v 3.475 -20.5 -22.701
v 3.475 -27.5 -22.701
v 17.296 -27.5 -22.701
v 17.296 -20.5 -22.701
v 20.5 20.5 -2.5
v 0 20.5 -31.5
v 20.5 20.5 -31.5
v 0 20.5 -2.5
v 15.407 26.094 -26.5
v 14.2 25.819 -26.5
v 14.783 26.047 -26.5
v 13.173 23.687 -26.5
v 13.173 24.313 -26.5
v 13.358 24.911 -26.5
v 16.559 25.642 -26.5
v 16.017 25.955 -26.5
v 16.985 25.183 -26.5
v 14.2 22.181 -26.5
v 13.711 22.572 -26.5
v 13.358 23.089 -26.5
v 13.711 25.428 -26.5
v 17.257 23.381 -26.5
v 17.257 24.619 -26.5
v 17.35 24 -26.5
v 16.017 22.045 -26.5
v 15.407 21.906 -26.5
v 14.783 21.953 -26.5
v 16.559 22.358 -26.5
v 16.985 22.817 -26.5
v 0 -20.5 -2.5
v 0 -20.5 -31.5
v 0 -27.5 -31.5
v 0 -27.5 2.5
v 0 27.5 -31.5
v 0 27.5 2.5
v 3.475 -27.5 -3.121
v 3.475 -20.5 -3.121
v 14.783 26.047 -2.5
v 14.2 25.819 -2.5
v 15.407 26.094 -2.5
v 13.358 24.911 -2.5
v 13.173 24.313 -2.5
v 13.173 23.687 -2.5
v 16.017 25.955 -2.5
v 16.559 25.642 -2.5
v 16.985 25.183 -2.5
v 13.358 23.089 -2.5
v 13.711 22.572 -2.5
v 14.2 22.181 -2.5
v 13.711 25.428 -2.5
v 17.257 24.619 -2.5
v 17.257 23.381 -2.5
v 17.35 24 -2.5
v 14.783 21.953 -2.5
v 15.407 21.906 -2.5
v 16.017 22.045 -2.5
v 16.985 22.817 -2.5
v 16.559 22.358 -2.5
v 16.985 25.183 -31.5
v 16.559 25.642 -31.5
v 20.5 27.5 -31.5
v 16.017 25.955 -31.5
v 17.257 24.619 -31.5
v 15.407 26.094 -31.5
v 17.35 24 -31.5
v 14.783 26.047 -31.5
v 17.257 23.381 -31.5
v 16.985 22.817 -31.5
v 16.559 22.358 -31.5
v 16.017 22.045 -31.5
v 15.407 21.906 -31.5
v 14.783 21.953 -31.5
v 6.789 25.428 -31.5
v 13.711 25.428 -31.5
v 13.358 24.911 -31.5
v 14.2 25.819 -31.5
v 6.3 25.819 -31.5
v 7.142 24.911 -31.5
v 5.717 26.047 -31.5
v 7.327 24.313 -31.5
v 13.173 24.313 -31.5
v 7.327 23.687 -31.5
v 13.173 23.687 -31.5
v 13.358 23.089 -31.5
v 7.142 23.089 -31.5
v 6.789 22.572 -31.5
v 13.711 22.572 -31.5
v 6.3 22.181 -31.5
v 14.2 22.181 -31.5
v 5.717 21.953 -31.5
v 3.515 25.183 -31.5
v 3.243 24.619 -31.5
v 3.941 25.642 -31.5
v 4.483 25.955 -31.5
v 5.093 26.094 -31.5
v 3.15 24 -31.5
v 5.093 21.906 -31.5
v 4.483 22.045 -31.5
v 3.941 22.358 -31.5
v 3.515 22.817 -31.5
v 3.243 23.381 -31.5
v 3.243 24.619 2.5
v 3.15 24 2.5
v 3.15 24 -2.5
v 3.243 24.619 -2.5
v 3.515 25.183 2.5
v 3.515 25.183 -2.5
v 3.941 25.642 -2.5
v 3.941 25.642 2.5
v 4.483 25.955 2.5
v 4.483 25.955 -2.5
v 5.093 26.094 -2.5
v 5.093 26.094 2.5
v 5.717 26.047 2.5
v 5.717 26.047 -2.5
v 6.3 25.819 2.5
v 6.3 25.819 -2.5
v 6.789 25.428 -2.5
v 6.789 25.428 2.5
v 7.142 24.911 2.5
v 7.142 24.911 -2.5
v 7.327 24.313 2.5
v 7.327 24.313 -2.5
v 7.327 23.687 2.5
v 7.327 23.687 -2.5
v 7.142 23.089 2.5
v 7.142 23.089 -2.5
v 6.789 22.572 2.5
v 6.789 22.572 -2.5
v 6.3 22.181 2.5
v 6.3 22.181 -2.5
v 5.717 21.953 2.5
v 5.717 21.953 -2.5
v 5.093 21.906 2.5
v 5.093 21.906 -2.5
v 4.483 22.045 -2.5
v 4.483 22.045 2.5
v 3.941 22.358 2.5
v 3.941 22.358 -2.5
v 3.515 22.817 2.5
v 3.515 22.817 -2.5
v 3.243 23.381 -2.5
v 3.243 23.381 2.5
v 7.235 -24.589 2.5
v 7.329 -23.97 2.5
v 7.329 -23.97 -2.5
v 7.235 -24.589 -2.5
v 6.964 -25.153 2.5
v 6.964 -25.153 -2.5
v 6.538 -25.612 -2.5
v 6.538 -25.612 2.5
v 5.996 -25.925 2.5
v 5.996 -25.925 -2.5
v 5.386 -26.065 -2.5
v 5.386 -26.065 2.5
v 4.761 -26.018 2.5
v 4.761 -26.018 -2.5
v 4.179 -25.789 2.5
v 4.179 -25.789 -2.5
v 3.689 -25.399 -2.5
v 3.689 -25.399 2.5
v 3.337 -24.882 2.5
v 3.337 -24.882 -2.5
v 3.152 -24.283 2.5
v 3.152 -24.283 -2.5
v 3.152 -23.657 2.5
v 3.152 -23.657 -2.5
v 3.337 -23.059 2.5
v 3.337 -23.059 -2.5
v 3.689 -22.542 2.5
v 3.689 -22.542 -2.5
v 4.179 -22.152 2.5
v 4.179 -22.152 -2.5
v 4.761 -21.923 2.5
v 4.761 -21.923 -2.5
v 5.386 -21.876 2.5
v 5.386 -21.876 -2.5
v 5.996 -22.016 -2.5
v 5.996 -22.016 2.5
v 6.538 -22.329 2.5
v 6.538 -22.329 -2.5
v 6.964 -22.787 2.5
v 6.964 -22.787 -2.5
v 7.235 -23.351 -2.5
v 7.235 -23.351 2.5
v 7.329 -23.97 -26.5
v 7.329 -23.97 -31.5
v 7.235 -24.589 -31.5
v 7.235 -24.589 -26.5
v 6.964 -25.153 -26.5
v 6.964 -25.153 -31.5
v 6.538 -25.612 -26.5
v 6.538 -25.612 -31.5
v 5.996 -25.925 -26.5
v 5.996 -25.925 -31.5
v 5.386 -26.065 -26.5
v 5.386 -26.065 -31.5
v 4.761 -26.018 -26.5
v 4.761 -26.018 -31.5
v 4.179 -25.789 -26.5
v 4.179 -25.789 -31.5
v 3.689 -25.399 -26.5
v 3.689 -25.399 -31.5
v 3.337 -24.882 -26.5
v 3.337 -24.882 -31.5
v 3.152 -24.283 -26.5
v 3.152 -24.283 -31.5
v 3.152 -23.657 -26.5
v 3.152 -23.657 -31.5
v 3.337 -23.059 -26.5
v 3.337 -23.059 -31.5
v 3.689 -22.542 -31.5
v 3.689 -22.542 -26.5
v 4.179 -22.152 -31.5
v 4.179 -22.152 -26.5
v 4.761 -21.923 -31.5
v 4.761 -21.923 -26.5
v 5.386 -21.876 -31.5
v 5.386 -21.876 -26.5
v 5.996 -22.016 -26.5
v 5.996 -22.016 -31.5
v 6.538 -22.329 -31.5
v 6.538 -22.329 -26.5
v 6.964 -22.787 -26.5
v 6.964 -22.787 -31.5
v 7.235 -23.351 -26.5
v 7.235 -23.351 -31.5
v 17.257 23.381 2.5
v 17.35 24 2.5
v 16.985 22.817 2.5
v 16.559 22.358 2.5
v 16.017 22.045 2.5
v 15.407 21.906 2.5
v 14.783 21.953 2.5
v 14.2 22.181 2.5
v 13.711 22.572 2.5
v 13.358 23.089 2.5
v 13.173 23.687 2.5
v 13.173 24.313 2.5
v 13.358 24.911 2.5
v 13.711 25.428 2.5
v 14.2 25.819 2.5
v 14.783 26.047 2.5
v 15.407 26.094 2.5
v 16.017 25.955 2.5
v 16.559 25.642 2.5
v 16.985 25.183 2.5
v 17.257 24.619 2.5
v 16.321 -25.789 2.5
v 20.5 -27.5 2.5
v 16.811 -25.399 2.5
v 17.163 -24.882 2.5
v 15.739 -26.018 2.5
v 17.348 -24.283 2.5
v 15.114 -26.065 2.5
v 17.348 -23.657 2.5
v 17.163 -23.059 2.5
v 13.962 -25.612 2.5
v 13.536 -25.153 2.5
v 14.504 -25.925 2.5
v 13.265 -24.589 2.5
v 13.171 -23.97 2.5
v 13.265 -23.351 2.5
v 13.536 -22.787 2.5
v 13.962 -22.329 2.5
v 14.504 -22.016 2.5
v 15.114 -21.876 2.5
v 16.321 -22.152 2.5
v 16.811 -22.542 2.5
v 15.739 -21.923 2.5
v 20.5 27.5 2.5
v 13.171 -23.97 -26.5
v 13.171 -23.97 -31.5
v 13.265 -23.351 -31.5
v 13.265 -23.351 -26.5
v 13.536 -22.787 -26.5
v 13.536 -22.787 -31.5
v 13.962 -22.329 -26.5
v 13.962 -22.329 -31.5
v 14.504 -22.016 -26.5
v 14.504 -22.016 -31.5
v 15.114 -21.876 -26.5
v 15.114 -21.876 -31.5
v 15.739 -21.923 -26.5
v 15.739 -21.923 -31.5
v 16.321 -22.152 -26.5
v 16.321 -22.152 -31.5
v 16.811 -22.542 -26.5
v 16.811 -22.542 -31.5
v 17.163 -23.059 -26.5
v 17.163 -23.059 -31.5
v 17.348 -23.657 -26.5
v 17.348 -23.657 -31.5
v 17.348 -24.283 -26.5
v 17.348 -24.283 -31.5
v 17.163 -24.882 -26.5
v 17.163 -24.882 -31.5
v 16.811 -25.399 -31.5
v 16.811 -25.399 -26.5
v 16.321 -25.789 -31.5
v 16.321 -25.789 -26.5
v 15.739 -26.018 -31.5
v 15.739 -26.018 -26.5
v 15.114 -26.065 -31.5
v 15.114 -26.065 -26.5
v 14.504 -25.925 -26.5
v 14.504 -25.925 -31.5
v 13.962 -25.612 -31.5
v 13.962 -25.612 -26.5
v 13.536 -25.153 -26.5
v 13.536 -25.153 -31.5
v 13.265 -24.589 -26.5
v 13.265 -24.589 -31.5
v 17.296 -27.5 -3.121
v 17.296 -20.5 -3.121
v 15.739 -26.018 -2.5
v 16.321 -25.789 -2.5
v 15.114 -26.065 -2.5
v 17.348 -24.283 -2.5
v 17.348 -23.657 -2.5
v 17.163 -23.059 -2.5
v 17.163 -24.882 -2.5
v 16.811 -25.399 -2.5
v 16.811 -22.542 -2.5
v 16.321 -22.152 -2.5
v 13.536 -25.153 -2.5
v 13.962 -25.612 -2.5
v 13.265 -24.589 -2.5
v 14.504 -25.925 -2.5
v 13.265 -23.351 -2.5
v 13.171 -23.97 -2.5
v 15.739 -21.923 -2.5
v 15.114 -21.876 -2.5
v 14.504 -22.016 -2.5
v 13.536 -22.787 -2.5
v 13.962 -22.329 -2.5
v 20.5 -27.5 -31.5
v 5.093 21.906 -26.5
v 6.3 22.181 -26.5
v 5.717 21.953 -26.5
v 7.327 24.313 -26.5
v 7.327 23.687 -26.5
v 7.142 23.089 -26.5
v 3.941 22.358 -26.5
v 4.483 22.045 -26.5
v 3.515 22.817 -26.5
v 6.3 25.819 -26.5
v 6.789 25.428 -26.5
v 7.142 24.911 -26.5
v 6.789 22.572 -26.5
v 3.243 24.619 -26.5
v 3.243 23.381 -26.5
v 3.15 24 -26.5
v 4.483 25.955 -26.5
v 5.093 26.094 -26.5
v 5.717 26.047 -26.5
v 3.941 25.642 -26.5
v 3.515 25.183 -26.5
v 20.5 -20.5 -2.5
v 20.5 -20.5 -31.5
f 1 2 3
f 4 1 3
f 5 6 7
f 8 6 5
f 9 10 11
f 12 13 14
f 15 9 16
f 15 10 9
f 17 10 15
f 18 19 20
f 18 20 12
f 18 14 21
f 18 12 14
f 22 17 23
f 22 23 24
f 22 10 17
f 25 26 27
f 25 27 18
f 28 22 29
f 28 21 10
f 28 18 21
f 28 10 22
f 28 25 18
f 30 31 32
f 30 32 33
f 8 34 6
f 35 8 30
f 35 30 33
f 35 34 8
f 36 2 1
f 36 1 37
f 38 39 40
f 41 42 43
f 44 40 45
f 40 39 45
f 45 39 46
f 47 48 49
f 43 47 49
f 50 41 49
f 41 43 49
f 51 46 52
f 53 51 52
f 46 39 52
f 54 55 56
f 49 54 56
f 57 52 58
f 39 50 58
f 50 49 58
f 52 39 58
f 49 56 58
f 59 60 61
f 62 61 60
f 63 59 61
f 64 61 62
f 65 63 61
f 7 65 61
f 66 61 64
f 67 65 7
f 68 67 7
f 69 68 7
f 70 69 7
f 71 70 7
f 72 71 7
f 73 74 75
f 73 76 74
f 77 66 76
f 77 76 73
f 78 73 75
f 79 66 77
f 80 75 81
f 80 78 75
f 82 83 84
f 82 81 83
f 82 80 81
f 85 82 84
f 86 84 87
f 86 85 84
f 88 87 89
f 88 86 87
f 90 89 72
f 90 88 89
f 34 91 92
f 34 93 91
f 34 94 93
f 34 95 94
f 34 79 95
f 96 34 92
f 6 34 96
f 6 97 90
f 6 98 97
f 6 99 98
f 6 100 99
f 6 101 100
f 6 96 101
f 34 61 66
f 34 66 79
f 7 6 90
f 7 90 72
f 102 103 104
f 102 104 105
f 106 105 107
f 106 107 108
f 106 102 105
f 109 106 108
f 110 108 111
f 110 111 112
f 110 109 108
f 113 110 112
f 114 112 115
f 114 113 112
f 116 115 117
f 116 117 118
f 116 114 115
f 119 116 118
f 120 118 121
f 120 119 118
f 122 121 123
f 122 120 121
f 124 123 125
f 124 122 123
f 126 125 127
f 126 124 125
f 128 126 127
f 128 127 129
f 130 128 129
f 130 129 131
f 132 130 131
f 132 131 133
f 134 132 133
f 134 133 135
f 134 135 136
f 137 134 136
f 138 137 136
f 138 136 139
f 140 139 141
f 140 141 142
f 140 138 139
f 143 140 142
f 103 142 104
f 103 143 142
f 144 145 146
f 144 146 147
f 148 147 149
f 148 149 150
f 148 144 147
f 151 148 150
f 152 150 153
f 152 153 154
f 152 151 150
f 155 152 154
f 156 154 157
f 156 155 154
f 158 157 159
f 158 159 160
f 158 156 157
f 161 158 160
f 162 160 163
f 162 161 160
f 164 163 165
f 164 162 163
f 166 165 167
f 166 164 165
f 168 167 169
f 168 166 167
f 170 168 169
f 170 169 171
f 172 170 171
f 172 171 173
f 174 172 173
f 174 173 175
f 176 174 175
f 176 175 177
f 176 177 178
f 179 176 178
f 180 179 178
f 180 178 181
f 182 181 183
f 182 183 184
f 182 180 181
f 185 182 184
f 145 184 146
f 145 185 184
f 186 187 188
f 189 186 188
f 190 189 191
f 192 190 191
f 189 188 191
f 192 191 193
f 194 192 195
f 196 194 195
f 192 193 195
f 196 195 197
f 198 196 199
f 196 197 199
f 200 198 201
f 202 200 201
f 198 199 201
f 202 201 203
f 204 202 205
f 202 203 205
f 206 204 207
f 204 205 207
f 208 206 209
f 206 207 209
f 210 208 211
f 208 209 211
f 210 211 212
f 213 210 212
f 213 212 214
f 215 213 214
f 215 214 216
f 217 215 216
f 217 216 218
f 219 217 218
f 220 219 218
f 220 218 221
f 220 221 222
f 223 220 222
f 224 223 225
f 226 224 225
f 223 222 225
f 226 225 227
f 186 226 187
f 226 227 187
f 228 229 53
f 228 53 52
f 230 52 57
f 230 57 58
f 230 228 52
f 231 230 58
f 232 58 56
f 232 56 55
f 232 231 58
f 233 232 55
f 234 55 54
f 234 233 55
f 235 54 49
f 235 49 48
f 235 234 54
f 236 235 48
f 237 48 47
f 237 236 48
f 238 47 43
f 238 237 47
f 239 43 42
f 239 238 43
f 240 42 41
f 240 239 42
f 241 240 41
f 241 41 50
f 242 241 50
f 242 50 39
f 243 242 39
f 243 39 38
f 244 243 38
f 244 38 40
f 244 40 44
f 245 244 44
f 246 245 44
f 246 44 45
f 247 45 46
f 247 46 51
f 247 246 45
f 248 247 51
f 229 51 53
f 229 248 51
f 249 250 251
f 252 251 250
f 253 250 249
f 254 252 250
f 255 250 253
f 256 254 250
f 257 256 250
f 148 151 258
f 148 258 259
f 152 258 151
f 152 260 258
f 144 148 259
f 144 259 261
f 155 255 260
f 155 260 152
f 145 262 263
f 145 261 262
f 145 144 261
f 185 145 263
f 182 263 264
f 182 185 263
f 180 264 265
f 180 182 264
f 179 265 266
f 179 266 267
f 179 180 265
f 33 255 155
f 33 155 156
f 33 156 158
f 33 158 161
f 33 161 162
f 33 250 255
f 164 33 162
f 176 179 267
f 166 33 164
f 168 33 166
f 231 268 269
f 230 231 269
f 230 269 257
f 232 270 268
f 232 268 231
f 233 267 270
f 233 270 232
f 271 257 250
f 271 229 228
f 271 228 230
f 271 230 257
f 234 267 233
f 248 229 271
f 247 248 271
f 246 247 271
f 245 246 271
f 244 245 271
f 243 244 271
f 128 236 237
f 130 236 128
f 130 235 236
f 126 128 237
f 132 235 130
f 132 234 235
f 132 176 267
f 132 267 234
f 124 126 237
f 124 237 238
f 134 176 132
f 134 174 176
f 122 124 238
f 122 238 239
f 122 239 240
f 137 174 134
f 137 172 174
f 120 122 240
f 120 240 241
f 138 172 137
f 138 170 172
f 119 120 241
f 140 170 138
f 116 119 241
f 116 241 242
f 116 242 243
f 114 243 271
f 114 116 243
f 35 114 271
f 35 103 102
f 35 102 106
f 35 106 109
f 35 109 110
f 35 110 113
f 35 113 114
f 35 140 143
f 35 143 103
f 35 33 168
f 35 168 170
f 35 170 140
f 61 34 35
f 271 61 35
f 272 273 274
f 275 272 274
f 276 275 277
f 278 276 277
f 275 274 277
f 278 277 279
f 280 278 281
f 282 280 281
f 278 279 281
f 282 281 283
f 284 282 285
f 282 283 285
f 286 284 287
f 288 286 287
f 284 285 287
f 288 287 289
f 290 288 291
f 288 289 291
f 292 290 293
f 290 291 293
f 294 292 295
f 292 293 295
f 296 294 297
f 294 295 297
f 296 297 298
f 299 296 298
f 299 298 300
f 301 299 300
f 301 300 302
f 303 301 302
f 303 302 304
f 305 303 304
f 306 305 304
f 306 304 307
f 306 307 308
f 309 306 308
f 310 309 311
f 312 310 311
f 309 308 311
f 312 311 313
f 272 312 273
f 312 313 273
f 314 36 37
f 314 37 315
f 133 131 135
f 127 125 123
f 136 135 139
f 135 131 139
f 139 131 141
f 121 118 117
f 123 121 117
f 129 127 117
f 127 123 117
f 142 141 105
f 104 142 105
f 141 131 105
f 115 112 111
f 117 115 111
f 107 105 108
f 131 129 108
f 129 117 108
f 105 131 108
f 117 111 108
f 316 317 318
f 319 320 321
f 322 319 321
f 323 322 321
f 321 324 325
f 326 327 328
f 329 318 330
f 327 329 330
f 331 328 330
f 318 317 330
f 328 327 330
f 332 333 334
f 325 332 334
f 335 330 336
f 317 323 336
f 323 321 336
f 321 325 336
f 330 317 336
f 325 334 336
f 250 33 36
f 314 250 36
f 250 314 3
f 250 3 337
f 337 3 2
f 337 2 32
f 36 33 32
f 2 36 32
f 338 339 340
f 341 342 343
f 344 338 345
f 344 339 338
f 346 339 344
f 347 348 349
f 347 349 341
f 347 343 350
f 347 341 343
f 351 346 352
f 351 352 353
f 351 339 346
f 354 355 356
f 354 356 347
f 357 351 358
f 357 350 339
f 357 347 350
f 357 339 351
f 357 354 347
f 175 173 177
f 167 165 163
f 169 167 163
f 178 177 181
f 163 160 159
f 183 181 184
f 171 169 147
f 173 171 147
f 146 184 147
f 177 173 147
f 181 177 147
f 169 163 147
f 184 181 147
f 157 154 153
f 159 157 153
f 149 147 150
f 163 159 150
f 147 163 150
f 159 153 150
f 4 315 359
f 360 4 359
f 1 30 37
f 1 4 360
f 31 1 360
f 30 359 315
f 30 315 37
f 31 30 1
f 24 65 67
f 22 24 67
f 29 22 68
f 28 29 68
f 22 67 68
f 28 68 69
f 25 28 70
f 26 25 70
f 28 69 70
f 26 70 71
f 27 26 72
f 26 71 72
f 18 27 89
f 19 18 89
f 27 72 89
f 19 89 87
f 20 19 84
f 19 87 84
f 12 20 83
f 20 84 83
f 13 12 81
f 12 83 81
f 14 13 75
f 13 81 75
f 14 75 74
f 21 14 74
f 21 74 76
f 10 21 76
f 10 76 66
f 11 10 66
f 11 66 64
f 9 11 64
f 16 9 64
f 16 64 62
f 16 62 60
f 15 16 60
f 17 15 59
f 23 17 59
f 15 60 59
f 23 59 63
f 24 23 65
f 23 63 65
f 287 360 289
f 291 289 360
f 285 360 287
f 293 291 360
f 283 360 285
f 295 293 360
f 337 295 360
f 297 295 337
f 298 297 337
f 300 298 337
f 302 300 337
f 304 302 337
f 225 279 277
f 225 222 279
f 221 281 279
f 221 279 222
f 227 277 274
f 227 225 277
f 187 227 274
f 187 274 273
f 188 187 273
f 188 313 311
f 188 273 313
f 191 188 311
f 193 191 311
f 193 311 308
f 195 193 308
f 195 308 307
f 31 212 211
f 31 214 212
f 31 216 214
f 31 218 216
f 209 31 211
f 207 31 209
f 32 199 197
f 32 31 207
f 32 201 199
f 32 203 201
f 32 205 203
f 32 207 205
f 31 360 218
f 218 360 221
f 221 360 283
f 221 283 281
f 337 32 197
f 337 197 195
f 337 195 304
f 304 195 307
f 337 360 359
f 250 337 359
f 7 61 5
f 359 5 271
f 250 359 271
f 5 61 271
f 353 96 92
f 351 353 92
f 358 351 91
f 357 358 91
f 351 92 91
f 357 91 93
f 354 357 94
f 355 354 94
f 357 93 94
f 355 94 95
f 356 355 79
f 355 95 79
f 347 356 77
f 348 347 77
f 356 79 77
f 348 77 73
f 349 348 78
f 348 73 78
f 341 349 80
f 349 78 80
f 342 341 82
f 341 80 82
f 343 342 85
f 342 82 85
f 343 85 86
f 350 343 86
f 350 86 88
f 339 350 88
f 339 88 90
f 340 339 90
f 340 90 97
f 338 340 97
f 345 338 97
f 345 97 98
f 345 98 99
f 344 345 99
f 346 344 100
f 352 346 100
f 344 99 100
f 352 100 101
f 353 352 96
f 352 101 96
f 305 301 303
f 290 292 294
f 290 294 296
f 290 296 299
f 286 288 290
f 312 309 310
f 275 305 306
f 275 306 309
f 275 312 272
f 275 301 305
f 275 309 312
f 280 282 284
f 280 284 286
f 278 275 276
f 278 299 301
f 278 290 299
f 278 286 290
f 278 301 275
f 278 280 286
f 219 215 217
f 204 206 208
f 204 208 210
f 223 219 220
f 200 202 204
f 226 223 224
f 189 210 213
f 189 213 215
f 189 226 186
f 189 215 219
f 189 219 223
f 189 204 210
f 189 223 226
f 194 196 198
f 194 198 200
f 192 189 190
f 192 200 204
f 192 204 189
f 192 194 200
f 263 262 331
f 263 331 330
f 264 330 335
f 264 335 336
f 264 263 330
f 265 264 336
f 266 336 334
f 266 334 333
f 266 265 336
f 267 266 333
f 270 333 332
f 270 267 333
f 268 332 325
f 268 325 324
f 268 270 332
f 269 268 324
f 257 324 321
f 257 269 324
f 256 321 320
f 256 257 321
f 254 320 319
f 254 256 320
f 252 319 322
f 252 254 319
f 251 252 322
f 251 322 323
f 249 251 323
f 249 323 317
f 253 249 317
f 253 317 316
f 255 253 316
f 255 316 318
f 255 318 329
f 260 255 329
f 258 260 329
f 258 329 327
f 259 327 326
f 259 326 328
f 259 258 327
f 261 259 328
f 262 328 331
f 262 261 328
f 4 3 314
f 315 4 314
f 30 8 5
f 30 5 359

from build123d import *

# Parameters (mm, degrees)
BOSS_EXTRUDE1_DEPTH = 20.5
SKETCH3_W           = 13.820879987
SKETCH3_H           = 19.579579981
CUT_EXTRUDE1_DEPTH  = 7
SKETCH4_R           = 2.1
CUT_EXTRUDE2_DEPTH  = 5


with BuildPart() as part:
    # Sketch1 → Boss-Extrude1 (new body)
    with BuildSketch(Plane(origin=(0, 0, 0), x_dir=(0, 0, -1), z_dir=(1, 0, 0))):
        Polygon((-2.5, 27.5), (2.5, 27.5), (31.5, 27.5), (31.5, 20.5), (2.5, 20.5), (2.5, -20.5), (31.5, -20.5), (31.5, -27.5), (2.5, -27.5), (-2.5, -27.5), align=None)
    extrude(amount=BOSS_EXTRUDE1_DEPTH)

    # Sketch3 → Cut-Extrude1 (cut)
    with BuildSketch(Plane.XZ.offset(27.5)):
        with Locations((10.385498824, -12.910906187)):
            Rectangle(SKETCH3_W, SKETCH3_H)
    extrude(amount=-CUT_EXTRUDE1_DEPTH, mode=Mode.SUBTRACT)

    # Sketch4 → Cut-Extrude2 (cut)
    with BuildSketch(Plane(origin=(0, 0, -31.5), x_dir=(-1, 0, 0), z_dir=(0, 0, -1))):
        with Locations((-15.271378587, -23.970399076)):
            Circle(SKETCH4_R)
        with Locations(Location((-5.228621413, -23.970399076, 0), (0, 0, 180))):
            Circle(SKETCH4_R)
        with Locations((-5.25, 24)):
            Circle(SKETCH4_R)
        with Locations(Location((-15.25, 24, 0), (0, 0, 180))):
            Circle(SKETCH4_R)
    cut_extrude2 = extrude(amount=-CUT_EXTRUDE2_DEPTH, mode=Mode.SUBTRACT)

    # Mirror1: Cut-Extrude2 across plane
    add(cut_extrude2.mirror(Plane.XY.offset(-14.5)), mode=Mode.SUBTRACT)


solid = part.part
